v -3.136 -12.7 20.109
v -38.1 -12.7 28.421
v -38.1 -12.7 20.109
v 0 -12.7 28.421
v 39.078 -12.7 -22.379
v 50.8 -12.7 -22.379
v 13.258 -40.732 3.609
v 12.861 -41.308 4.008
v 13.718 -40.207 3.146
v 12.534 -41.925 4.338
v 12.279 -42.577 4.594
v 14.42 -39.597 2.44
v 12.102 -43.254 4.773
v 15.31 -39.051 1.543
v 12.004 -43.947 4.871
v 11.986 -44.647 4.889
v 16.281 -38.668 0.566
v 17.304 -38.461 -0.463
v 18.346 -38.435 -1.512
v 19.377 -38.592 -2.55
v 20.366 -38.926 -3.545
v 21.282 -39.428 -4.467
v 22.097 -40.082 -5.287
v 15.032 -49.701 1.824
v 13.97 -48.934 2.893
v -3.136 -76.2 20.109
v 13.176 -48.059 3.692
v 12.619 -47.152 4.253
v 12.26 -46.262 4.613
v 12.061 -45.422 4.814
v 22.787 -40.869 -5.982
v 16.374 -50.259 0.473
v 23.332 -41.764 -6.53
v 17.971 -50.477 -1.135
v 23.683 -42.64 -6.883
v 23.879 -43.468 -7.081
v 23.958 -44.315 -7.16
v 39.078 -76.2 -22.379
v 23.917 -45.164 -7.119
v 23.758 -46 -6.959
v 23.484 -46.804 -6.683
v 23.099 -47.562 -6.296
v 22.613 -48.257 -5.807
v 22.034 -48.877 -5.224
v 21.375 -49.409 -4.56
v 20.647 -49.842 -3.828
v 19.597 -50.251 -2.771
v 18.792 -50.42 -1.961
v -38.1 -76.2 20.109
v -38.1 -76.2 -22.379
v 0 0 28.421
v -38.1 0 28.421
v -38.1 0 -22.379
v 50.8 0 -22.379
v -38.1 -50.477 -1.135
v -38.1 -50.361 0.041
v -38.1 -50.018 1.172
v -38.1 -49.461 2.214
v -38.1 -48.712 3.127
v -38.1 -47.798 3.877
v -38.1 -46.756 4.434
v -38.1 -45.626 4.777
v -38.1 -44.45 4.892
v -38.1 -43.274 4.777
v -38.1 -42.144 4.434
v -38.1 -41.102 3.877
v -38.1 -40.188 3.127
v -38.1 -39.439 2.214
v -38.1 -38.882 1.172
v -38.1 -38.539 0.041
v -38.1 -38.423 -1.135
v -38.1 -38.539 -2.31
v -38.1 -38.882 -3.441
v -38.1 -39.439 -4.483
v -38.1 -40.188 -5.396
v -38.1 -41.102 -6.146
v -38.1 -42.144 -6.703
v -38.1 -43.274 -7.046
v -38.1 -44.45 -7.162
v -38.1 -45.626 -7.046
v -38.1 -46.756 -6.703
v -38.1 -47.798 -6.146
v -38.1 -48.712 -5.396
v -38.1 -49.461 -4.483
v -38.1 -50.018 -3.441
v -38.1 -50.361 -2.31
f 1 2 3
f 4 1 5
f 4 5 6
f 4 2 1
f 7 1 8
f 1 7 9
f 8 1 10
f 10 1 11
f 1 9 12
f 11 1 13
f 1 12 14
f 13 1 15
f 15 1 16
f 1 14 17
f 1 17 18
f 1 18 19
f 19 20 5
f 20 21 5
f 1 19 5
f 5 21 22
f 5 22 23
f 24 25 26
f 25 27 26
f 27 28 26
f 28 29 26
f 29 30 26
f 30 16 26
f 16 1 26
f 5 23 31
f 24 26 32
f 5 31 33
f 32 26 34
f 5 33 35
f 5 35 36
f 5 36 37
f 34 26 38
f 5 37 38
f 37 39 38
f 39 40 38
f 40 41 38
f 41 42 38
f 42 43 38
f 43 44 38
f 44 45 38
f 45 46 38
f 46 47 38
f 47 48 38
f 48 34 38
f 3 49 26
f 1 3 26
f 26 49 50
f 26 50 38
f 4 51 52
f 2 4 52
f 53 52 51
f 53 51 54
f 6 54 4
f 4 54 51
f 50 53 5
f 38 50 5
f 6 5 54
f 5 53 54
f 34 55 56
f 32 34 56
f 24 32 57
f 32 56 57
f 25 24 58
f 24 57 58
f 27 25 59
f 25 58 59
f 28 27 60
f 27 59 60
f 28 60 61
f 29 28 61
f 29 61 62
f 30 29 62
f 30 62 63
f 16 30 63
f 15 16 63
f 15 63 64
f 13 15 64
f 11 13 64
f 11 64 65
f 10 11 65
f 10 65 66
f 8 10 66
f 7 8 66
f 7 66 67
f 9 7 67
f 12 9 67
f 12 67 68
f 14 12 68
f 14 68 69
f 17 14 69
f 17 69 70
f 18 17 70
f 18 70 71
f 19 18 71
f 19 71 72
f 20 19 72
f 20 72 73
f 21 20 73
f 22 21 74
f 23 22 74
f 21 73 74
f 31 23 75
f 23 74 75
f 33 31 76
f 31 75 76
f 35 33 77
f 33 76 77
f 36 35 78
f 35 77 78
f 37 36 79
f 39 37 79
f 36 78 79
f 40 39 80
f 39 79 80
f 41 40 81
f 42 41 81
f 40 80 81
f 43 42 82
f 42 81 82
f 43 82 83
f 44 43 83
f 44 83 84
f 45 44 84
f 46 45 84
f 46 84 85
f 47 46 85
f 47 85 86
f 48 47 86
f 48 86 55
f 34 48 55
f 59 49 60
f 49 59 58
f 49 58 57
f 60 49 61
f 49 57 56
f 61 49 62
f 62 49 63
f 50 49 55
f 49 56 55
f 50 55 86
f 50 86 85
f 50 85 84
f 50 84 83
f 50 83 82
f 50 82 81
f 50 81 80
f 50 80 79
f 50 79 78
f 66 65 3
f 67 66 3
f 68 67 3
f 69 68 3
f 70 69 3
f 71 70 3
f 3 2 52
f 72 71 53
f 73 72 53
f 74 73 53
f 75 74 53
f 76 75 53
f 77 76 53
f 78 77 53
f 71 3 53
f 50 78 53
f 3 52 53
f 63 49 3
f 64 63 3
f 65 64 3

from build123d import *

# Parameters (mm, degrees)
F1_DEPTH = 76.2
F3_DEPTH = 63.5
F4_R     = 6.026978
F5_DEPTH = 254


with BuildPart() as f1:
    # F0 (on Front) → F1 (new body)
    with BuildSketch(Plane.XZ):
        Polygon((0, 28.421371), (-38.1, 28.421371), (-38.1, -22.378629), (50.8, -22.378629), align=None)
    extrude(amount=F1_DEPTH)

    # F2 (on face) → F3 (cut)
    with BuildSketch(Plane.XZ.offset(76.2)):
        Polygon((-38.1, 28.421371), (-38.1, 20.109465), (-3.135807, 20.109465), (39.077971, -22.378629), (50.8, -22.378629), (0, 28.421371), align=None)
    extrude(amount=-F3_DEPTH, mode=Mode.SUBTRACT)

    # F4 (on face) → F5 (cut)
    with BuildSketch(Plane(origin=(-38.1, 0, 0), x_dir=(0, -1, 0), z_dir=(-1, 0, 0))):
        with Locations((44.45, -1.134582)):
            Circle(F4_R)
    extrude(amount=-F5_DEPTH, mode=Mode.SUBTRACT)


solid = f1.part
